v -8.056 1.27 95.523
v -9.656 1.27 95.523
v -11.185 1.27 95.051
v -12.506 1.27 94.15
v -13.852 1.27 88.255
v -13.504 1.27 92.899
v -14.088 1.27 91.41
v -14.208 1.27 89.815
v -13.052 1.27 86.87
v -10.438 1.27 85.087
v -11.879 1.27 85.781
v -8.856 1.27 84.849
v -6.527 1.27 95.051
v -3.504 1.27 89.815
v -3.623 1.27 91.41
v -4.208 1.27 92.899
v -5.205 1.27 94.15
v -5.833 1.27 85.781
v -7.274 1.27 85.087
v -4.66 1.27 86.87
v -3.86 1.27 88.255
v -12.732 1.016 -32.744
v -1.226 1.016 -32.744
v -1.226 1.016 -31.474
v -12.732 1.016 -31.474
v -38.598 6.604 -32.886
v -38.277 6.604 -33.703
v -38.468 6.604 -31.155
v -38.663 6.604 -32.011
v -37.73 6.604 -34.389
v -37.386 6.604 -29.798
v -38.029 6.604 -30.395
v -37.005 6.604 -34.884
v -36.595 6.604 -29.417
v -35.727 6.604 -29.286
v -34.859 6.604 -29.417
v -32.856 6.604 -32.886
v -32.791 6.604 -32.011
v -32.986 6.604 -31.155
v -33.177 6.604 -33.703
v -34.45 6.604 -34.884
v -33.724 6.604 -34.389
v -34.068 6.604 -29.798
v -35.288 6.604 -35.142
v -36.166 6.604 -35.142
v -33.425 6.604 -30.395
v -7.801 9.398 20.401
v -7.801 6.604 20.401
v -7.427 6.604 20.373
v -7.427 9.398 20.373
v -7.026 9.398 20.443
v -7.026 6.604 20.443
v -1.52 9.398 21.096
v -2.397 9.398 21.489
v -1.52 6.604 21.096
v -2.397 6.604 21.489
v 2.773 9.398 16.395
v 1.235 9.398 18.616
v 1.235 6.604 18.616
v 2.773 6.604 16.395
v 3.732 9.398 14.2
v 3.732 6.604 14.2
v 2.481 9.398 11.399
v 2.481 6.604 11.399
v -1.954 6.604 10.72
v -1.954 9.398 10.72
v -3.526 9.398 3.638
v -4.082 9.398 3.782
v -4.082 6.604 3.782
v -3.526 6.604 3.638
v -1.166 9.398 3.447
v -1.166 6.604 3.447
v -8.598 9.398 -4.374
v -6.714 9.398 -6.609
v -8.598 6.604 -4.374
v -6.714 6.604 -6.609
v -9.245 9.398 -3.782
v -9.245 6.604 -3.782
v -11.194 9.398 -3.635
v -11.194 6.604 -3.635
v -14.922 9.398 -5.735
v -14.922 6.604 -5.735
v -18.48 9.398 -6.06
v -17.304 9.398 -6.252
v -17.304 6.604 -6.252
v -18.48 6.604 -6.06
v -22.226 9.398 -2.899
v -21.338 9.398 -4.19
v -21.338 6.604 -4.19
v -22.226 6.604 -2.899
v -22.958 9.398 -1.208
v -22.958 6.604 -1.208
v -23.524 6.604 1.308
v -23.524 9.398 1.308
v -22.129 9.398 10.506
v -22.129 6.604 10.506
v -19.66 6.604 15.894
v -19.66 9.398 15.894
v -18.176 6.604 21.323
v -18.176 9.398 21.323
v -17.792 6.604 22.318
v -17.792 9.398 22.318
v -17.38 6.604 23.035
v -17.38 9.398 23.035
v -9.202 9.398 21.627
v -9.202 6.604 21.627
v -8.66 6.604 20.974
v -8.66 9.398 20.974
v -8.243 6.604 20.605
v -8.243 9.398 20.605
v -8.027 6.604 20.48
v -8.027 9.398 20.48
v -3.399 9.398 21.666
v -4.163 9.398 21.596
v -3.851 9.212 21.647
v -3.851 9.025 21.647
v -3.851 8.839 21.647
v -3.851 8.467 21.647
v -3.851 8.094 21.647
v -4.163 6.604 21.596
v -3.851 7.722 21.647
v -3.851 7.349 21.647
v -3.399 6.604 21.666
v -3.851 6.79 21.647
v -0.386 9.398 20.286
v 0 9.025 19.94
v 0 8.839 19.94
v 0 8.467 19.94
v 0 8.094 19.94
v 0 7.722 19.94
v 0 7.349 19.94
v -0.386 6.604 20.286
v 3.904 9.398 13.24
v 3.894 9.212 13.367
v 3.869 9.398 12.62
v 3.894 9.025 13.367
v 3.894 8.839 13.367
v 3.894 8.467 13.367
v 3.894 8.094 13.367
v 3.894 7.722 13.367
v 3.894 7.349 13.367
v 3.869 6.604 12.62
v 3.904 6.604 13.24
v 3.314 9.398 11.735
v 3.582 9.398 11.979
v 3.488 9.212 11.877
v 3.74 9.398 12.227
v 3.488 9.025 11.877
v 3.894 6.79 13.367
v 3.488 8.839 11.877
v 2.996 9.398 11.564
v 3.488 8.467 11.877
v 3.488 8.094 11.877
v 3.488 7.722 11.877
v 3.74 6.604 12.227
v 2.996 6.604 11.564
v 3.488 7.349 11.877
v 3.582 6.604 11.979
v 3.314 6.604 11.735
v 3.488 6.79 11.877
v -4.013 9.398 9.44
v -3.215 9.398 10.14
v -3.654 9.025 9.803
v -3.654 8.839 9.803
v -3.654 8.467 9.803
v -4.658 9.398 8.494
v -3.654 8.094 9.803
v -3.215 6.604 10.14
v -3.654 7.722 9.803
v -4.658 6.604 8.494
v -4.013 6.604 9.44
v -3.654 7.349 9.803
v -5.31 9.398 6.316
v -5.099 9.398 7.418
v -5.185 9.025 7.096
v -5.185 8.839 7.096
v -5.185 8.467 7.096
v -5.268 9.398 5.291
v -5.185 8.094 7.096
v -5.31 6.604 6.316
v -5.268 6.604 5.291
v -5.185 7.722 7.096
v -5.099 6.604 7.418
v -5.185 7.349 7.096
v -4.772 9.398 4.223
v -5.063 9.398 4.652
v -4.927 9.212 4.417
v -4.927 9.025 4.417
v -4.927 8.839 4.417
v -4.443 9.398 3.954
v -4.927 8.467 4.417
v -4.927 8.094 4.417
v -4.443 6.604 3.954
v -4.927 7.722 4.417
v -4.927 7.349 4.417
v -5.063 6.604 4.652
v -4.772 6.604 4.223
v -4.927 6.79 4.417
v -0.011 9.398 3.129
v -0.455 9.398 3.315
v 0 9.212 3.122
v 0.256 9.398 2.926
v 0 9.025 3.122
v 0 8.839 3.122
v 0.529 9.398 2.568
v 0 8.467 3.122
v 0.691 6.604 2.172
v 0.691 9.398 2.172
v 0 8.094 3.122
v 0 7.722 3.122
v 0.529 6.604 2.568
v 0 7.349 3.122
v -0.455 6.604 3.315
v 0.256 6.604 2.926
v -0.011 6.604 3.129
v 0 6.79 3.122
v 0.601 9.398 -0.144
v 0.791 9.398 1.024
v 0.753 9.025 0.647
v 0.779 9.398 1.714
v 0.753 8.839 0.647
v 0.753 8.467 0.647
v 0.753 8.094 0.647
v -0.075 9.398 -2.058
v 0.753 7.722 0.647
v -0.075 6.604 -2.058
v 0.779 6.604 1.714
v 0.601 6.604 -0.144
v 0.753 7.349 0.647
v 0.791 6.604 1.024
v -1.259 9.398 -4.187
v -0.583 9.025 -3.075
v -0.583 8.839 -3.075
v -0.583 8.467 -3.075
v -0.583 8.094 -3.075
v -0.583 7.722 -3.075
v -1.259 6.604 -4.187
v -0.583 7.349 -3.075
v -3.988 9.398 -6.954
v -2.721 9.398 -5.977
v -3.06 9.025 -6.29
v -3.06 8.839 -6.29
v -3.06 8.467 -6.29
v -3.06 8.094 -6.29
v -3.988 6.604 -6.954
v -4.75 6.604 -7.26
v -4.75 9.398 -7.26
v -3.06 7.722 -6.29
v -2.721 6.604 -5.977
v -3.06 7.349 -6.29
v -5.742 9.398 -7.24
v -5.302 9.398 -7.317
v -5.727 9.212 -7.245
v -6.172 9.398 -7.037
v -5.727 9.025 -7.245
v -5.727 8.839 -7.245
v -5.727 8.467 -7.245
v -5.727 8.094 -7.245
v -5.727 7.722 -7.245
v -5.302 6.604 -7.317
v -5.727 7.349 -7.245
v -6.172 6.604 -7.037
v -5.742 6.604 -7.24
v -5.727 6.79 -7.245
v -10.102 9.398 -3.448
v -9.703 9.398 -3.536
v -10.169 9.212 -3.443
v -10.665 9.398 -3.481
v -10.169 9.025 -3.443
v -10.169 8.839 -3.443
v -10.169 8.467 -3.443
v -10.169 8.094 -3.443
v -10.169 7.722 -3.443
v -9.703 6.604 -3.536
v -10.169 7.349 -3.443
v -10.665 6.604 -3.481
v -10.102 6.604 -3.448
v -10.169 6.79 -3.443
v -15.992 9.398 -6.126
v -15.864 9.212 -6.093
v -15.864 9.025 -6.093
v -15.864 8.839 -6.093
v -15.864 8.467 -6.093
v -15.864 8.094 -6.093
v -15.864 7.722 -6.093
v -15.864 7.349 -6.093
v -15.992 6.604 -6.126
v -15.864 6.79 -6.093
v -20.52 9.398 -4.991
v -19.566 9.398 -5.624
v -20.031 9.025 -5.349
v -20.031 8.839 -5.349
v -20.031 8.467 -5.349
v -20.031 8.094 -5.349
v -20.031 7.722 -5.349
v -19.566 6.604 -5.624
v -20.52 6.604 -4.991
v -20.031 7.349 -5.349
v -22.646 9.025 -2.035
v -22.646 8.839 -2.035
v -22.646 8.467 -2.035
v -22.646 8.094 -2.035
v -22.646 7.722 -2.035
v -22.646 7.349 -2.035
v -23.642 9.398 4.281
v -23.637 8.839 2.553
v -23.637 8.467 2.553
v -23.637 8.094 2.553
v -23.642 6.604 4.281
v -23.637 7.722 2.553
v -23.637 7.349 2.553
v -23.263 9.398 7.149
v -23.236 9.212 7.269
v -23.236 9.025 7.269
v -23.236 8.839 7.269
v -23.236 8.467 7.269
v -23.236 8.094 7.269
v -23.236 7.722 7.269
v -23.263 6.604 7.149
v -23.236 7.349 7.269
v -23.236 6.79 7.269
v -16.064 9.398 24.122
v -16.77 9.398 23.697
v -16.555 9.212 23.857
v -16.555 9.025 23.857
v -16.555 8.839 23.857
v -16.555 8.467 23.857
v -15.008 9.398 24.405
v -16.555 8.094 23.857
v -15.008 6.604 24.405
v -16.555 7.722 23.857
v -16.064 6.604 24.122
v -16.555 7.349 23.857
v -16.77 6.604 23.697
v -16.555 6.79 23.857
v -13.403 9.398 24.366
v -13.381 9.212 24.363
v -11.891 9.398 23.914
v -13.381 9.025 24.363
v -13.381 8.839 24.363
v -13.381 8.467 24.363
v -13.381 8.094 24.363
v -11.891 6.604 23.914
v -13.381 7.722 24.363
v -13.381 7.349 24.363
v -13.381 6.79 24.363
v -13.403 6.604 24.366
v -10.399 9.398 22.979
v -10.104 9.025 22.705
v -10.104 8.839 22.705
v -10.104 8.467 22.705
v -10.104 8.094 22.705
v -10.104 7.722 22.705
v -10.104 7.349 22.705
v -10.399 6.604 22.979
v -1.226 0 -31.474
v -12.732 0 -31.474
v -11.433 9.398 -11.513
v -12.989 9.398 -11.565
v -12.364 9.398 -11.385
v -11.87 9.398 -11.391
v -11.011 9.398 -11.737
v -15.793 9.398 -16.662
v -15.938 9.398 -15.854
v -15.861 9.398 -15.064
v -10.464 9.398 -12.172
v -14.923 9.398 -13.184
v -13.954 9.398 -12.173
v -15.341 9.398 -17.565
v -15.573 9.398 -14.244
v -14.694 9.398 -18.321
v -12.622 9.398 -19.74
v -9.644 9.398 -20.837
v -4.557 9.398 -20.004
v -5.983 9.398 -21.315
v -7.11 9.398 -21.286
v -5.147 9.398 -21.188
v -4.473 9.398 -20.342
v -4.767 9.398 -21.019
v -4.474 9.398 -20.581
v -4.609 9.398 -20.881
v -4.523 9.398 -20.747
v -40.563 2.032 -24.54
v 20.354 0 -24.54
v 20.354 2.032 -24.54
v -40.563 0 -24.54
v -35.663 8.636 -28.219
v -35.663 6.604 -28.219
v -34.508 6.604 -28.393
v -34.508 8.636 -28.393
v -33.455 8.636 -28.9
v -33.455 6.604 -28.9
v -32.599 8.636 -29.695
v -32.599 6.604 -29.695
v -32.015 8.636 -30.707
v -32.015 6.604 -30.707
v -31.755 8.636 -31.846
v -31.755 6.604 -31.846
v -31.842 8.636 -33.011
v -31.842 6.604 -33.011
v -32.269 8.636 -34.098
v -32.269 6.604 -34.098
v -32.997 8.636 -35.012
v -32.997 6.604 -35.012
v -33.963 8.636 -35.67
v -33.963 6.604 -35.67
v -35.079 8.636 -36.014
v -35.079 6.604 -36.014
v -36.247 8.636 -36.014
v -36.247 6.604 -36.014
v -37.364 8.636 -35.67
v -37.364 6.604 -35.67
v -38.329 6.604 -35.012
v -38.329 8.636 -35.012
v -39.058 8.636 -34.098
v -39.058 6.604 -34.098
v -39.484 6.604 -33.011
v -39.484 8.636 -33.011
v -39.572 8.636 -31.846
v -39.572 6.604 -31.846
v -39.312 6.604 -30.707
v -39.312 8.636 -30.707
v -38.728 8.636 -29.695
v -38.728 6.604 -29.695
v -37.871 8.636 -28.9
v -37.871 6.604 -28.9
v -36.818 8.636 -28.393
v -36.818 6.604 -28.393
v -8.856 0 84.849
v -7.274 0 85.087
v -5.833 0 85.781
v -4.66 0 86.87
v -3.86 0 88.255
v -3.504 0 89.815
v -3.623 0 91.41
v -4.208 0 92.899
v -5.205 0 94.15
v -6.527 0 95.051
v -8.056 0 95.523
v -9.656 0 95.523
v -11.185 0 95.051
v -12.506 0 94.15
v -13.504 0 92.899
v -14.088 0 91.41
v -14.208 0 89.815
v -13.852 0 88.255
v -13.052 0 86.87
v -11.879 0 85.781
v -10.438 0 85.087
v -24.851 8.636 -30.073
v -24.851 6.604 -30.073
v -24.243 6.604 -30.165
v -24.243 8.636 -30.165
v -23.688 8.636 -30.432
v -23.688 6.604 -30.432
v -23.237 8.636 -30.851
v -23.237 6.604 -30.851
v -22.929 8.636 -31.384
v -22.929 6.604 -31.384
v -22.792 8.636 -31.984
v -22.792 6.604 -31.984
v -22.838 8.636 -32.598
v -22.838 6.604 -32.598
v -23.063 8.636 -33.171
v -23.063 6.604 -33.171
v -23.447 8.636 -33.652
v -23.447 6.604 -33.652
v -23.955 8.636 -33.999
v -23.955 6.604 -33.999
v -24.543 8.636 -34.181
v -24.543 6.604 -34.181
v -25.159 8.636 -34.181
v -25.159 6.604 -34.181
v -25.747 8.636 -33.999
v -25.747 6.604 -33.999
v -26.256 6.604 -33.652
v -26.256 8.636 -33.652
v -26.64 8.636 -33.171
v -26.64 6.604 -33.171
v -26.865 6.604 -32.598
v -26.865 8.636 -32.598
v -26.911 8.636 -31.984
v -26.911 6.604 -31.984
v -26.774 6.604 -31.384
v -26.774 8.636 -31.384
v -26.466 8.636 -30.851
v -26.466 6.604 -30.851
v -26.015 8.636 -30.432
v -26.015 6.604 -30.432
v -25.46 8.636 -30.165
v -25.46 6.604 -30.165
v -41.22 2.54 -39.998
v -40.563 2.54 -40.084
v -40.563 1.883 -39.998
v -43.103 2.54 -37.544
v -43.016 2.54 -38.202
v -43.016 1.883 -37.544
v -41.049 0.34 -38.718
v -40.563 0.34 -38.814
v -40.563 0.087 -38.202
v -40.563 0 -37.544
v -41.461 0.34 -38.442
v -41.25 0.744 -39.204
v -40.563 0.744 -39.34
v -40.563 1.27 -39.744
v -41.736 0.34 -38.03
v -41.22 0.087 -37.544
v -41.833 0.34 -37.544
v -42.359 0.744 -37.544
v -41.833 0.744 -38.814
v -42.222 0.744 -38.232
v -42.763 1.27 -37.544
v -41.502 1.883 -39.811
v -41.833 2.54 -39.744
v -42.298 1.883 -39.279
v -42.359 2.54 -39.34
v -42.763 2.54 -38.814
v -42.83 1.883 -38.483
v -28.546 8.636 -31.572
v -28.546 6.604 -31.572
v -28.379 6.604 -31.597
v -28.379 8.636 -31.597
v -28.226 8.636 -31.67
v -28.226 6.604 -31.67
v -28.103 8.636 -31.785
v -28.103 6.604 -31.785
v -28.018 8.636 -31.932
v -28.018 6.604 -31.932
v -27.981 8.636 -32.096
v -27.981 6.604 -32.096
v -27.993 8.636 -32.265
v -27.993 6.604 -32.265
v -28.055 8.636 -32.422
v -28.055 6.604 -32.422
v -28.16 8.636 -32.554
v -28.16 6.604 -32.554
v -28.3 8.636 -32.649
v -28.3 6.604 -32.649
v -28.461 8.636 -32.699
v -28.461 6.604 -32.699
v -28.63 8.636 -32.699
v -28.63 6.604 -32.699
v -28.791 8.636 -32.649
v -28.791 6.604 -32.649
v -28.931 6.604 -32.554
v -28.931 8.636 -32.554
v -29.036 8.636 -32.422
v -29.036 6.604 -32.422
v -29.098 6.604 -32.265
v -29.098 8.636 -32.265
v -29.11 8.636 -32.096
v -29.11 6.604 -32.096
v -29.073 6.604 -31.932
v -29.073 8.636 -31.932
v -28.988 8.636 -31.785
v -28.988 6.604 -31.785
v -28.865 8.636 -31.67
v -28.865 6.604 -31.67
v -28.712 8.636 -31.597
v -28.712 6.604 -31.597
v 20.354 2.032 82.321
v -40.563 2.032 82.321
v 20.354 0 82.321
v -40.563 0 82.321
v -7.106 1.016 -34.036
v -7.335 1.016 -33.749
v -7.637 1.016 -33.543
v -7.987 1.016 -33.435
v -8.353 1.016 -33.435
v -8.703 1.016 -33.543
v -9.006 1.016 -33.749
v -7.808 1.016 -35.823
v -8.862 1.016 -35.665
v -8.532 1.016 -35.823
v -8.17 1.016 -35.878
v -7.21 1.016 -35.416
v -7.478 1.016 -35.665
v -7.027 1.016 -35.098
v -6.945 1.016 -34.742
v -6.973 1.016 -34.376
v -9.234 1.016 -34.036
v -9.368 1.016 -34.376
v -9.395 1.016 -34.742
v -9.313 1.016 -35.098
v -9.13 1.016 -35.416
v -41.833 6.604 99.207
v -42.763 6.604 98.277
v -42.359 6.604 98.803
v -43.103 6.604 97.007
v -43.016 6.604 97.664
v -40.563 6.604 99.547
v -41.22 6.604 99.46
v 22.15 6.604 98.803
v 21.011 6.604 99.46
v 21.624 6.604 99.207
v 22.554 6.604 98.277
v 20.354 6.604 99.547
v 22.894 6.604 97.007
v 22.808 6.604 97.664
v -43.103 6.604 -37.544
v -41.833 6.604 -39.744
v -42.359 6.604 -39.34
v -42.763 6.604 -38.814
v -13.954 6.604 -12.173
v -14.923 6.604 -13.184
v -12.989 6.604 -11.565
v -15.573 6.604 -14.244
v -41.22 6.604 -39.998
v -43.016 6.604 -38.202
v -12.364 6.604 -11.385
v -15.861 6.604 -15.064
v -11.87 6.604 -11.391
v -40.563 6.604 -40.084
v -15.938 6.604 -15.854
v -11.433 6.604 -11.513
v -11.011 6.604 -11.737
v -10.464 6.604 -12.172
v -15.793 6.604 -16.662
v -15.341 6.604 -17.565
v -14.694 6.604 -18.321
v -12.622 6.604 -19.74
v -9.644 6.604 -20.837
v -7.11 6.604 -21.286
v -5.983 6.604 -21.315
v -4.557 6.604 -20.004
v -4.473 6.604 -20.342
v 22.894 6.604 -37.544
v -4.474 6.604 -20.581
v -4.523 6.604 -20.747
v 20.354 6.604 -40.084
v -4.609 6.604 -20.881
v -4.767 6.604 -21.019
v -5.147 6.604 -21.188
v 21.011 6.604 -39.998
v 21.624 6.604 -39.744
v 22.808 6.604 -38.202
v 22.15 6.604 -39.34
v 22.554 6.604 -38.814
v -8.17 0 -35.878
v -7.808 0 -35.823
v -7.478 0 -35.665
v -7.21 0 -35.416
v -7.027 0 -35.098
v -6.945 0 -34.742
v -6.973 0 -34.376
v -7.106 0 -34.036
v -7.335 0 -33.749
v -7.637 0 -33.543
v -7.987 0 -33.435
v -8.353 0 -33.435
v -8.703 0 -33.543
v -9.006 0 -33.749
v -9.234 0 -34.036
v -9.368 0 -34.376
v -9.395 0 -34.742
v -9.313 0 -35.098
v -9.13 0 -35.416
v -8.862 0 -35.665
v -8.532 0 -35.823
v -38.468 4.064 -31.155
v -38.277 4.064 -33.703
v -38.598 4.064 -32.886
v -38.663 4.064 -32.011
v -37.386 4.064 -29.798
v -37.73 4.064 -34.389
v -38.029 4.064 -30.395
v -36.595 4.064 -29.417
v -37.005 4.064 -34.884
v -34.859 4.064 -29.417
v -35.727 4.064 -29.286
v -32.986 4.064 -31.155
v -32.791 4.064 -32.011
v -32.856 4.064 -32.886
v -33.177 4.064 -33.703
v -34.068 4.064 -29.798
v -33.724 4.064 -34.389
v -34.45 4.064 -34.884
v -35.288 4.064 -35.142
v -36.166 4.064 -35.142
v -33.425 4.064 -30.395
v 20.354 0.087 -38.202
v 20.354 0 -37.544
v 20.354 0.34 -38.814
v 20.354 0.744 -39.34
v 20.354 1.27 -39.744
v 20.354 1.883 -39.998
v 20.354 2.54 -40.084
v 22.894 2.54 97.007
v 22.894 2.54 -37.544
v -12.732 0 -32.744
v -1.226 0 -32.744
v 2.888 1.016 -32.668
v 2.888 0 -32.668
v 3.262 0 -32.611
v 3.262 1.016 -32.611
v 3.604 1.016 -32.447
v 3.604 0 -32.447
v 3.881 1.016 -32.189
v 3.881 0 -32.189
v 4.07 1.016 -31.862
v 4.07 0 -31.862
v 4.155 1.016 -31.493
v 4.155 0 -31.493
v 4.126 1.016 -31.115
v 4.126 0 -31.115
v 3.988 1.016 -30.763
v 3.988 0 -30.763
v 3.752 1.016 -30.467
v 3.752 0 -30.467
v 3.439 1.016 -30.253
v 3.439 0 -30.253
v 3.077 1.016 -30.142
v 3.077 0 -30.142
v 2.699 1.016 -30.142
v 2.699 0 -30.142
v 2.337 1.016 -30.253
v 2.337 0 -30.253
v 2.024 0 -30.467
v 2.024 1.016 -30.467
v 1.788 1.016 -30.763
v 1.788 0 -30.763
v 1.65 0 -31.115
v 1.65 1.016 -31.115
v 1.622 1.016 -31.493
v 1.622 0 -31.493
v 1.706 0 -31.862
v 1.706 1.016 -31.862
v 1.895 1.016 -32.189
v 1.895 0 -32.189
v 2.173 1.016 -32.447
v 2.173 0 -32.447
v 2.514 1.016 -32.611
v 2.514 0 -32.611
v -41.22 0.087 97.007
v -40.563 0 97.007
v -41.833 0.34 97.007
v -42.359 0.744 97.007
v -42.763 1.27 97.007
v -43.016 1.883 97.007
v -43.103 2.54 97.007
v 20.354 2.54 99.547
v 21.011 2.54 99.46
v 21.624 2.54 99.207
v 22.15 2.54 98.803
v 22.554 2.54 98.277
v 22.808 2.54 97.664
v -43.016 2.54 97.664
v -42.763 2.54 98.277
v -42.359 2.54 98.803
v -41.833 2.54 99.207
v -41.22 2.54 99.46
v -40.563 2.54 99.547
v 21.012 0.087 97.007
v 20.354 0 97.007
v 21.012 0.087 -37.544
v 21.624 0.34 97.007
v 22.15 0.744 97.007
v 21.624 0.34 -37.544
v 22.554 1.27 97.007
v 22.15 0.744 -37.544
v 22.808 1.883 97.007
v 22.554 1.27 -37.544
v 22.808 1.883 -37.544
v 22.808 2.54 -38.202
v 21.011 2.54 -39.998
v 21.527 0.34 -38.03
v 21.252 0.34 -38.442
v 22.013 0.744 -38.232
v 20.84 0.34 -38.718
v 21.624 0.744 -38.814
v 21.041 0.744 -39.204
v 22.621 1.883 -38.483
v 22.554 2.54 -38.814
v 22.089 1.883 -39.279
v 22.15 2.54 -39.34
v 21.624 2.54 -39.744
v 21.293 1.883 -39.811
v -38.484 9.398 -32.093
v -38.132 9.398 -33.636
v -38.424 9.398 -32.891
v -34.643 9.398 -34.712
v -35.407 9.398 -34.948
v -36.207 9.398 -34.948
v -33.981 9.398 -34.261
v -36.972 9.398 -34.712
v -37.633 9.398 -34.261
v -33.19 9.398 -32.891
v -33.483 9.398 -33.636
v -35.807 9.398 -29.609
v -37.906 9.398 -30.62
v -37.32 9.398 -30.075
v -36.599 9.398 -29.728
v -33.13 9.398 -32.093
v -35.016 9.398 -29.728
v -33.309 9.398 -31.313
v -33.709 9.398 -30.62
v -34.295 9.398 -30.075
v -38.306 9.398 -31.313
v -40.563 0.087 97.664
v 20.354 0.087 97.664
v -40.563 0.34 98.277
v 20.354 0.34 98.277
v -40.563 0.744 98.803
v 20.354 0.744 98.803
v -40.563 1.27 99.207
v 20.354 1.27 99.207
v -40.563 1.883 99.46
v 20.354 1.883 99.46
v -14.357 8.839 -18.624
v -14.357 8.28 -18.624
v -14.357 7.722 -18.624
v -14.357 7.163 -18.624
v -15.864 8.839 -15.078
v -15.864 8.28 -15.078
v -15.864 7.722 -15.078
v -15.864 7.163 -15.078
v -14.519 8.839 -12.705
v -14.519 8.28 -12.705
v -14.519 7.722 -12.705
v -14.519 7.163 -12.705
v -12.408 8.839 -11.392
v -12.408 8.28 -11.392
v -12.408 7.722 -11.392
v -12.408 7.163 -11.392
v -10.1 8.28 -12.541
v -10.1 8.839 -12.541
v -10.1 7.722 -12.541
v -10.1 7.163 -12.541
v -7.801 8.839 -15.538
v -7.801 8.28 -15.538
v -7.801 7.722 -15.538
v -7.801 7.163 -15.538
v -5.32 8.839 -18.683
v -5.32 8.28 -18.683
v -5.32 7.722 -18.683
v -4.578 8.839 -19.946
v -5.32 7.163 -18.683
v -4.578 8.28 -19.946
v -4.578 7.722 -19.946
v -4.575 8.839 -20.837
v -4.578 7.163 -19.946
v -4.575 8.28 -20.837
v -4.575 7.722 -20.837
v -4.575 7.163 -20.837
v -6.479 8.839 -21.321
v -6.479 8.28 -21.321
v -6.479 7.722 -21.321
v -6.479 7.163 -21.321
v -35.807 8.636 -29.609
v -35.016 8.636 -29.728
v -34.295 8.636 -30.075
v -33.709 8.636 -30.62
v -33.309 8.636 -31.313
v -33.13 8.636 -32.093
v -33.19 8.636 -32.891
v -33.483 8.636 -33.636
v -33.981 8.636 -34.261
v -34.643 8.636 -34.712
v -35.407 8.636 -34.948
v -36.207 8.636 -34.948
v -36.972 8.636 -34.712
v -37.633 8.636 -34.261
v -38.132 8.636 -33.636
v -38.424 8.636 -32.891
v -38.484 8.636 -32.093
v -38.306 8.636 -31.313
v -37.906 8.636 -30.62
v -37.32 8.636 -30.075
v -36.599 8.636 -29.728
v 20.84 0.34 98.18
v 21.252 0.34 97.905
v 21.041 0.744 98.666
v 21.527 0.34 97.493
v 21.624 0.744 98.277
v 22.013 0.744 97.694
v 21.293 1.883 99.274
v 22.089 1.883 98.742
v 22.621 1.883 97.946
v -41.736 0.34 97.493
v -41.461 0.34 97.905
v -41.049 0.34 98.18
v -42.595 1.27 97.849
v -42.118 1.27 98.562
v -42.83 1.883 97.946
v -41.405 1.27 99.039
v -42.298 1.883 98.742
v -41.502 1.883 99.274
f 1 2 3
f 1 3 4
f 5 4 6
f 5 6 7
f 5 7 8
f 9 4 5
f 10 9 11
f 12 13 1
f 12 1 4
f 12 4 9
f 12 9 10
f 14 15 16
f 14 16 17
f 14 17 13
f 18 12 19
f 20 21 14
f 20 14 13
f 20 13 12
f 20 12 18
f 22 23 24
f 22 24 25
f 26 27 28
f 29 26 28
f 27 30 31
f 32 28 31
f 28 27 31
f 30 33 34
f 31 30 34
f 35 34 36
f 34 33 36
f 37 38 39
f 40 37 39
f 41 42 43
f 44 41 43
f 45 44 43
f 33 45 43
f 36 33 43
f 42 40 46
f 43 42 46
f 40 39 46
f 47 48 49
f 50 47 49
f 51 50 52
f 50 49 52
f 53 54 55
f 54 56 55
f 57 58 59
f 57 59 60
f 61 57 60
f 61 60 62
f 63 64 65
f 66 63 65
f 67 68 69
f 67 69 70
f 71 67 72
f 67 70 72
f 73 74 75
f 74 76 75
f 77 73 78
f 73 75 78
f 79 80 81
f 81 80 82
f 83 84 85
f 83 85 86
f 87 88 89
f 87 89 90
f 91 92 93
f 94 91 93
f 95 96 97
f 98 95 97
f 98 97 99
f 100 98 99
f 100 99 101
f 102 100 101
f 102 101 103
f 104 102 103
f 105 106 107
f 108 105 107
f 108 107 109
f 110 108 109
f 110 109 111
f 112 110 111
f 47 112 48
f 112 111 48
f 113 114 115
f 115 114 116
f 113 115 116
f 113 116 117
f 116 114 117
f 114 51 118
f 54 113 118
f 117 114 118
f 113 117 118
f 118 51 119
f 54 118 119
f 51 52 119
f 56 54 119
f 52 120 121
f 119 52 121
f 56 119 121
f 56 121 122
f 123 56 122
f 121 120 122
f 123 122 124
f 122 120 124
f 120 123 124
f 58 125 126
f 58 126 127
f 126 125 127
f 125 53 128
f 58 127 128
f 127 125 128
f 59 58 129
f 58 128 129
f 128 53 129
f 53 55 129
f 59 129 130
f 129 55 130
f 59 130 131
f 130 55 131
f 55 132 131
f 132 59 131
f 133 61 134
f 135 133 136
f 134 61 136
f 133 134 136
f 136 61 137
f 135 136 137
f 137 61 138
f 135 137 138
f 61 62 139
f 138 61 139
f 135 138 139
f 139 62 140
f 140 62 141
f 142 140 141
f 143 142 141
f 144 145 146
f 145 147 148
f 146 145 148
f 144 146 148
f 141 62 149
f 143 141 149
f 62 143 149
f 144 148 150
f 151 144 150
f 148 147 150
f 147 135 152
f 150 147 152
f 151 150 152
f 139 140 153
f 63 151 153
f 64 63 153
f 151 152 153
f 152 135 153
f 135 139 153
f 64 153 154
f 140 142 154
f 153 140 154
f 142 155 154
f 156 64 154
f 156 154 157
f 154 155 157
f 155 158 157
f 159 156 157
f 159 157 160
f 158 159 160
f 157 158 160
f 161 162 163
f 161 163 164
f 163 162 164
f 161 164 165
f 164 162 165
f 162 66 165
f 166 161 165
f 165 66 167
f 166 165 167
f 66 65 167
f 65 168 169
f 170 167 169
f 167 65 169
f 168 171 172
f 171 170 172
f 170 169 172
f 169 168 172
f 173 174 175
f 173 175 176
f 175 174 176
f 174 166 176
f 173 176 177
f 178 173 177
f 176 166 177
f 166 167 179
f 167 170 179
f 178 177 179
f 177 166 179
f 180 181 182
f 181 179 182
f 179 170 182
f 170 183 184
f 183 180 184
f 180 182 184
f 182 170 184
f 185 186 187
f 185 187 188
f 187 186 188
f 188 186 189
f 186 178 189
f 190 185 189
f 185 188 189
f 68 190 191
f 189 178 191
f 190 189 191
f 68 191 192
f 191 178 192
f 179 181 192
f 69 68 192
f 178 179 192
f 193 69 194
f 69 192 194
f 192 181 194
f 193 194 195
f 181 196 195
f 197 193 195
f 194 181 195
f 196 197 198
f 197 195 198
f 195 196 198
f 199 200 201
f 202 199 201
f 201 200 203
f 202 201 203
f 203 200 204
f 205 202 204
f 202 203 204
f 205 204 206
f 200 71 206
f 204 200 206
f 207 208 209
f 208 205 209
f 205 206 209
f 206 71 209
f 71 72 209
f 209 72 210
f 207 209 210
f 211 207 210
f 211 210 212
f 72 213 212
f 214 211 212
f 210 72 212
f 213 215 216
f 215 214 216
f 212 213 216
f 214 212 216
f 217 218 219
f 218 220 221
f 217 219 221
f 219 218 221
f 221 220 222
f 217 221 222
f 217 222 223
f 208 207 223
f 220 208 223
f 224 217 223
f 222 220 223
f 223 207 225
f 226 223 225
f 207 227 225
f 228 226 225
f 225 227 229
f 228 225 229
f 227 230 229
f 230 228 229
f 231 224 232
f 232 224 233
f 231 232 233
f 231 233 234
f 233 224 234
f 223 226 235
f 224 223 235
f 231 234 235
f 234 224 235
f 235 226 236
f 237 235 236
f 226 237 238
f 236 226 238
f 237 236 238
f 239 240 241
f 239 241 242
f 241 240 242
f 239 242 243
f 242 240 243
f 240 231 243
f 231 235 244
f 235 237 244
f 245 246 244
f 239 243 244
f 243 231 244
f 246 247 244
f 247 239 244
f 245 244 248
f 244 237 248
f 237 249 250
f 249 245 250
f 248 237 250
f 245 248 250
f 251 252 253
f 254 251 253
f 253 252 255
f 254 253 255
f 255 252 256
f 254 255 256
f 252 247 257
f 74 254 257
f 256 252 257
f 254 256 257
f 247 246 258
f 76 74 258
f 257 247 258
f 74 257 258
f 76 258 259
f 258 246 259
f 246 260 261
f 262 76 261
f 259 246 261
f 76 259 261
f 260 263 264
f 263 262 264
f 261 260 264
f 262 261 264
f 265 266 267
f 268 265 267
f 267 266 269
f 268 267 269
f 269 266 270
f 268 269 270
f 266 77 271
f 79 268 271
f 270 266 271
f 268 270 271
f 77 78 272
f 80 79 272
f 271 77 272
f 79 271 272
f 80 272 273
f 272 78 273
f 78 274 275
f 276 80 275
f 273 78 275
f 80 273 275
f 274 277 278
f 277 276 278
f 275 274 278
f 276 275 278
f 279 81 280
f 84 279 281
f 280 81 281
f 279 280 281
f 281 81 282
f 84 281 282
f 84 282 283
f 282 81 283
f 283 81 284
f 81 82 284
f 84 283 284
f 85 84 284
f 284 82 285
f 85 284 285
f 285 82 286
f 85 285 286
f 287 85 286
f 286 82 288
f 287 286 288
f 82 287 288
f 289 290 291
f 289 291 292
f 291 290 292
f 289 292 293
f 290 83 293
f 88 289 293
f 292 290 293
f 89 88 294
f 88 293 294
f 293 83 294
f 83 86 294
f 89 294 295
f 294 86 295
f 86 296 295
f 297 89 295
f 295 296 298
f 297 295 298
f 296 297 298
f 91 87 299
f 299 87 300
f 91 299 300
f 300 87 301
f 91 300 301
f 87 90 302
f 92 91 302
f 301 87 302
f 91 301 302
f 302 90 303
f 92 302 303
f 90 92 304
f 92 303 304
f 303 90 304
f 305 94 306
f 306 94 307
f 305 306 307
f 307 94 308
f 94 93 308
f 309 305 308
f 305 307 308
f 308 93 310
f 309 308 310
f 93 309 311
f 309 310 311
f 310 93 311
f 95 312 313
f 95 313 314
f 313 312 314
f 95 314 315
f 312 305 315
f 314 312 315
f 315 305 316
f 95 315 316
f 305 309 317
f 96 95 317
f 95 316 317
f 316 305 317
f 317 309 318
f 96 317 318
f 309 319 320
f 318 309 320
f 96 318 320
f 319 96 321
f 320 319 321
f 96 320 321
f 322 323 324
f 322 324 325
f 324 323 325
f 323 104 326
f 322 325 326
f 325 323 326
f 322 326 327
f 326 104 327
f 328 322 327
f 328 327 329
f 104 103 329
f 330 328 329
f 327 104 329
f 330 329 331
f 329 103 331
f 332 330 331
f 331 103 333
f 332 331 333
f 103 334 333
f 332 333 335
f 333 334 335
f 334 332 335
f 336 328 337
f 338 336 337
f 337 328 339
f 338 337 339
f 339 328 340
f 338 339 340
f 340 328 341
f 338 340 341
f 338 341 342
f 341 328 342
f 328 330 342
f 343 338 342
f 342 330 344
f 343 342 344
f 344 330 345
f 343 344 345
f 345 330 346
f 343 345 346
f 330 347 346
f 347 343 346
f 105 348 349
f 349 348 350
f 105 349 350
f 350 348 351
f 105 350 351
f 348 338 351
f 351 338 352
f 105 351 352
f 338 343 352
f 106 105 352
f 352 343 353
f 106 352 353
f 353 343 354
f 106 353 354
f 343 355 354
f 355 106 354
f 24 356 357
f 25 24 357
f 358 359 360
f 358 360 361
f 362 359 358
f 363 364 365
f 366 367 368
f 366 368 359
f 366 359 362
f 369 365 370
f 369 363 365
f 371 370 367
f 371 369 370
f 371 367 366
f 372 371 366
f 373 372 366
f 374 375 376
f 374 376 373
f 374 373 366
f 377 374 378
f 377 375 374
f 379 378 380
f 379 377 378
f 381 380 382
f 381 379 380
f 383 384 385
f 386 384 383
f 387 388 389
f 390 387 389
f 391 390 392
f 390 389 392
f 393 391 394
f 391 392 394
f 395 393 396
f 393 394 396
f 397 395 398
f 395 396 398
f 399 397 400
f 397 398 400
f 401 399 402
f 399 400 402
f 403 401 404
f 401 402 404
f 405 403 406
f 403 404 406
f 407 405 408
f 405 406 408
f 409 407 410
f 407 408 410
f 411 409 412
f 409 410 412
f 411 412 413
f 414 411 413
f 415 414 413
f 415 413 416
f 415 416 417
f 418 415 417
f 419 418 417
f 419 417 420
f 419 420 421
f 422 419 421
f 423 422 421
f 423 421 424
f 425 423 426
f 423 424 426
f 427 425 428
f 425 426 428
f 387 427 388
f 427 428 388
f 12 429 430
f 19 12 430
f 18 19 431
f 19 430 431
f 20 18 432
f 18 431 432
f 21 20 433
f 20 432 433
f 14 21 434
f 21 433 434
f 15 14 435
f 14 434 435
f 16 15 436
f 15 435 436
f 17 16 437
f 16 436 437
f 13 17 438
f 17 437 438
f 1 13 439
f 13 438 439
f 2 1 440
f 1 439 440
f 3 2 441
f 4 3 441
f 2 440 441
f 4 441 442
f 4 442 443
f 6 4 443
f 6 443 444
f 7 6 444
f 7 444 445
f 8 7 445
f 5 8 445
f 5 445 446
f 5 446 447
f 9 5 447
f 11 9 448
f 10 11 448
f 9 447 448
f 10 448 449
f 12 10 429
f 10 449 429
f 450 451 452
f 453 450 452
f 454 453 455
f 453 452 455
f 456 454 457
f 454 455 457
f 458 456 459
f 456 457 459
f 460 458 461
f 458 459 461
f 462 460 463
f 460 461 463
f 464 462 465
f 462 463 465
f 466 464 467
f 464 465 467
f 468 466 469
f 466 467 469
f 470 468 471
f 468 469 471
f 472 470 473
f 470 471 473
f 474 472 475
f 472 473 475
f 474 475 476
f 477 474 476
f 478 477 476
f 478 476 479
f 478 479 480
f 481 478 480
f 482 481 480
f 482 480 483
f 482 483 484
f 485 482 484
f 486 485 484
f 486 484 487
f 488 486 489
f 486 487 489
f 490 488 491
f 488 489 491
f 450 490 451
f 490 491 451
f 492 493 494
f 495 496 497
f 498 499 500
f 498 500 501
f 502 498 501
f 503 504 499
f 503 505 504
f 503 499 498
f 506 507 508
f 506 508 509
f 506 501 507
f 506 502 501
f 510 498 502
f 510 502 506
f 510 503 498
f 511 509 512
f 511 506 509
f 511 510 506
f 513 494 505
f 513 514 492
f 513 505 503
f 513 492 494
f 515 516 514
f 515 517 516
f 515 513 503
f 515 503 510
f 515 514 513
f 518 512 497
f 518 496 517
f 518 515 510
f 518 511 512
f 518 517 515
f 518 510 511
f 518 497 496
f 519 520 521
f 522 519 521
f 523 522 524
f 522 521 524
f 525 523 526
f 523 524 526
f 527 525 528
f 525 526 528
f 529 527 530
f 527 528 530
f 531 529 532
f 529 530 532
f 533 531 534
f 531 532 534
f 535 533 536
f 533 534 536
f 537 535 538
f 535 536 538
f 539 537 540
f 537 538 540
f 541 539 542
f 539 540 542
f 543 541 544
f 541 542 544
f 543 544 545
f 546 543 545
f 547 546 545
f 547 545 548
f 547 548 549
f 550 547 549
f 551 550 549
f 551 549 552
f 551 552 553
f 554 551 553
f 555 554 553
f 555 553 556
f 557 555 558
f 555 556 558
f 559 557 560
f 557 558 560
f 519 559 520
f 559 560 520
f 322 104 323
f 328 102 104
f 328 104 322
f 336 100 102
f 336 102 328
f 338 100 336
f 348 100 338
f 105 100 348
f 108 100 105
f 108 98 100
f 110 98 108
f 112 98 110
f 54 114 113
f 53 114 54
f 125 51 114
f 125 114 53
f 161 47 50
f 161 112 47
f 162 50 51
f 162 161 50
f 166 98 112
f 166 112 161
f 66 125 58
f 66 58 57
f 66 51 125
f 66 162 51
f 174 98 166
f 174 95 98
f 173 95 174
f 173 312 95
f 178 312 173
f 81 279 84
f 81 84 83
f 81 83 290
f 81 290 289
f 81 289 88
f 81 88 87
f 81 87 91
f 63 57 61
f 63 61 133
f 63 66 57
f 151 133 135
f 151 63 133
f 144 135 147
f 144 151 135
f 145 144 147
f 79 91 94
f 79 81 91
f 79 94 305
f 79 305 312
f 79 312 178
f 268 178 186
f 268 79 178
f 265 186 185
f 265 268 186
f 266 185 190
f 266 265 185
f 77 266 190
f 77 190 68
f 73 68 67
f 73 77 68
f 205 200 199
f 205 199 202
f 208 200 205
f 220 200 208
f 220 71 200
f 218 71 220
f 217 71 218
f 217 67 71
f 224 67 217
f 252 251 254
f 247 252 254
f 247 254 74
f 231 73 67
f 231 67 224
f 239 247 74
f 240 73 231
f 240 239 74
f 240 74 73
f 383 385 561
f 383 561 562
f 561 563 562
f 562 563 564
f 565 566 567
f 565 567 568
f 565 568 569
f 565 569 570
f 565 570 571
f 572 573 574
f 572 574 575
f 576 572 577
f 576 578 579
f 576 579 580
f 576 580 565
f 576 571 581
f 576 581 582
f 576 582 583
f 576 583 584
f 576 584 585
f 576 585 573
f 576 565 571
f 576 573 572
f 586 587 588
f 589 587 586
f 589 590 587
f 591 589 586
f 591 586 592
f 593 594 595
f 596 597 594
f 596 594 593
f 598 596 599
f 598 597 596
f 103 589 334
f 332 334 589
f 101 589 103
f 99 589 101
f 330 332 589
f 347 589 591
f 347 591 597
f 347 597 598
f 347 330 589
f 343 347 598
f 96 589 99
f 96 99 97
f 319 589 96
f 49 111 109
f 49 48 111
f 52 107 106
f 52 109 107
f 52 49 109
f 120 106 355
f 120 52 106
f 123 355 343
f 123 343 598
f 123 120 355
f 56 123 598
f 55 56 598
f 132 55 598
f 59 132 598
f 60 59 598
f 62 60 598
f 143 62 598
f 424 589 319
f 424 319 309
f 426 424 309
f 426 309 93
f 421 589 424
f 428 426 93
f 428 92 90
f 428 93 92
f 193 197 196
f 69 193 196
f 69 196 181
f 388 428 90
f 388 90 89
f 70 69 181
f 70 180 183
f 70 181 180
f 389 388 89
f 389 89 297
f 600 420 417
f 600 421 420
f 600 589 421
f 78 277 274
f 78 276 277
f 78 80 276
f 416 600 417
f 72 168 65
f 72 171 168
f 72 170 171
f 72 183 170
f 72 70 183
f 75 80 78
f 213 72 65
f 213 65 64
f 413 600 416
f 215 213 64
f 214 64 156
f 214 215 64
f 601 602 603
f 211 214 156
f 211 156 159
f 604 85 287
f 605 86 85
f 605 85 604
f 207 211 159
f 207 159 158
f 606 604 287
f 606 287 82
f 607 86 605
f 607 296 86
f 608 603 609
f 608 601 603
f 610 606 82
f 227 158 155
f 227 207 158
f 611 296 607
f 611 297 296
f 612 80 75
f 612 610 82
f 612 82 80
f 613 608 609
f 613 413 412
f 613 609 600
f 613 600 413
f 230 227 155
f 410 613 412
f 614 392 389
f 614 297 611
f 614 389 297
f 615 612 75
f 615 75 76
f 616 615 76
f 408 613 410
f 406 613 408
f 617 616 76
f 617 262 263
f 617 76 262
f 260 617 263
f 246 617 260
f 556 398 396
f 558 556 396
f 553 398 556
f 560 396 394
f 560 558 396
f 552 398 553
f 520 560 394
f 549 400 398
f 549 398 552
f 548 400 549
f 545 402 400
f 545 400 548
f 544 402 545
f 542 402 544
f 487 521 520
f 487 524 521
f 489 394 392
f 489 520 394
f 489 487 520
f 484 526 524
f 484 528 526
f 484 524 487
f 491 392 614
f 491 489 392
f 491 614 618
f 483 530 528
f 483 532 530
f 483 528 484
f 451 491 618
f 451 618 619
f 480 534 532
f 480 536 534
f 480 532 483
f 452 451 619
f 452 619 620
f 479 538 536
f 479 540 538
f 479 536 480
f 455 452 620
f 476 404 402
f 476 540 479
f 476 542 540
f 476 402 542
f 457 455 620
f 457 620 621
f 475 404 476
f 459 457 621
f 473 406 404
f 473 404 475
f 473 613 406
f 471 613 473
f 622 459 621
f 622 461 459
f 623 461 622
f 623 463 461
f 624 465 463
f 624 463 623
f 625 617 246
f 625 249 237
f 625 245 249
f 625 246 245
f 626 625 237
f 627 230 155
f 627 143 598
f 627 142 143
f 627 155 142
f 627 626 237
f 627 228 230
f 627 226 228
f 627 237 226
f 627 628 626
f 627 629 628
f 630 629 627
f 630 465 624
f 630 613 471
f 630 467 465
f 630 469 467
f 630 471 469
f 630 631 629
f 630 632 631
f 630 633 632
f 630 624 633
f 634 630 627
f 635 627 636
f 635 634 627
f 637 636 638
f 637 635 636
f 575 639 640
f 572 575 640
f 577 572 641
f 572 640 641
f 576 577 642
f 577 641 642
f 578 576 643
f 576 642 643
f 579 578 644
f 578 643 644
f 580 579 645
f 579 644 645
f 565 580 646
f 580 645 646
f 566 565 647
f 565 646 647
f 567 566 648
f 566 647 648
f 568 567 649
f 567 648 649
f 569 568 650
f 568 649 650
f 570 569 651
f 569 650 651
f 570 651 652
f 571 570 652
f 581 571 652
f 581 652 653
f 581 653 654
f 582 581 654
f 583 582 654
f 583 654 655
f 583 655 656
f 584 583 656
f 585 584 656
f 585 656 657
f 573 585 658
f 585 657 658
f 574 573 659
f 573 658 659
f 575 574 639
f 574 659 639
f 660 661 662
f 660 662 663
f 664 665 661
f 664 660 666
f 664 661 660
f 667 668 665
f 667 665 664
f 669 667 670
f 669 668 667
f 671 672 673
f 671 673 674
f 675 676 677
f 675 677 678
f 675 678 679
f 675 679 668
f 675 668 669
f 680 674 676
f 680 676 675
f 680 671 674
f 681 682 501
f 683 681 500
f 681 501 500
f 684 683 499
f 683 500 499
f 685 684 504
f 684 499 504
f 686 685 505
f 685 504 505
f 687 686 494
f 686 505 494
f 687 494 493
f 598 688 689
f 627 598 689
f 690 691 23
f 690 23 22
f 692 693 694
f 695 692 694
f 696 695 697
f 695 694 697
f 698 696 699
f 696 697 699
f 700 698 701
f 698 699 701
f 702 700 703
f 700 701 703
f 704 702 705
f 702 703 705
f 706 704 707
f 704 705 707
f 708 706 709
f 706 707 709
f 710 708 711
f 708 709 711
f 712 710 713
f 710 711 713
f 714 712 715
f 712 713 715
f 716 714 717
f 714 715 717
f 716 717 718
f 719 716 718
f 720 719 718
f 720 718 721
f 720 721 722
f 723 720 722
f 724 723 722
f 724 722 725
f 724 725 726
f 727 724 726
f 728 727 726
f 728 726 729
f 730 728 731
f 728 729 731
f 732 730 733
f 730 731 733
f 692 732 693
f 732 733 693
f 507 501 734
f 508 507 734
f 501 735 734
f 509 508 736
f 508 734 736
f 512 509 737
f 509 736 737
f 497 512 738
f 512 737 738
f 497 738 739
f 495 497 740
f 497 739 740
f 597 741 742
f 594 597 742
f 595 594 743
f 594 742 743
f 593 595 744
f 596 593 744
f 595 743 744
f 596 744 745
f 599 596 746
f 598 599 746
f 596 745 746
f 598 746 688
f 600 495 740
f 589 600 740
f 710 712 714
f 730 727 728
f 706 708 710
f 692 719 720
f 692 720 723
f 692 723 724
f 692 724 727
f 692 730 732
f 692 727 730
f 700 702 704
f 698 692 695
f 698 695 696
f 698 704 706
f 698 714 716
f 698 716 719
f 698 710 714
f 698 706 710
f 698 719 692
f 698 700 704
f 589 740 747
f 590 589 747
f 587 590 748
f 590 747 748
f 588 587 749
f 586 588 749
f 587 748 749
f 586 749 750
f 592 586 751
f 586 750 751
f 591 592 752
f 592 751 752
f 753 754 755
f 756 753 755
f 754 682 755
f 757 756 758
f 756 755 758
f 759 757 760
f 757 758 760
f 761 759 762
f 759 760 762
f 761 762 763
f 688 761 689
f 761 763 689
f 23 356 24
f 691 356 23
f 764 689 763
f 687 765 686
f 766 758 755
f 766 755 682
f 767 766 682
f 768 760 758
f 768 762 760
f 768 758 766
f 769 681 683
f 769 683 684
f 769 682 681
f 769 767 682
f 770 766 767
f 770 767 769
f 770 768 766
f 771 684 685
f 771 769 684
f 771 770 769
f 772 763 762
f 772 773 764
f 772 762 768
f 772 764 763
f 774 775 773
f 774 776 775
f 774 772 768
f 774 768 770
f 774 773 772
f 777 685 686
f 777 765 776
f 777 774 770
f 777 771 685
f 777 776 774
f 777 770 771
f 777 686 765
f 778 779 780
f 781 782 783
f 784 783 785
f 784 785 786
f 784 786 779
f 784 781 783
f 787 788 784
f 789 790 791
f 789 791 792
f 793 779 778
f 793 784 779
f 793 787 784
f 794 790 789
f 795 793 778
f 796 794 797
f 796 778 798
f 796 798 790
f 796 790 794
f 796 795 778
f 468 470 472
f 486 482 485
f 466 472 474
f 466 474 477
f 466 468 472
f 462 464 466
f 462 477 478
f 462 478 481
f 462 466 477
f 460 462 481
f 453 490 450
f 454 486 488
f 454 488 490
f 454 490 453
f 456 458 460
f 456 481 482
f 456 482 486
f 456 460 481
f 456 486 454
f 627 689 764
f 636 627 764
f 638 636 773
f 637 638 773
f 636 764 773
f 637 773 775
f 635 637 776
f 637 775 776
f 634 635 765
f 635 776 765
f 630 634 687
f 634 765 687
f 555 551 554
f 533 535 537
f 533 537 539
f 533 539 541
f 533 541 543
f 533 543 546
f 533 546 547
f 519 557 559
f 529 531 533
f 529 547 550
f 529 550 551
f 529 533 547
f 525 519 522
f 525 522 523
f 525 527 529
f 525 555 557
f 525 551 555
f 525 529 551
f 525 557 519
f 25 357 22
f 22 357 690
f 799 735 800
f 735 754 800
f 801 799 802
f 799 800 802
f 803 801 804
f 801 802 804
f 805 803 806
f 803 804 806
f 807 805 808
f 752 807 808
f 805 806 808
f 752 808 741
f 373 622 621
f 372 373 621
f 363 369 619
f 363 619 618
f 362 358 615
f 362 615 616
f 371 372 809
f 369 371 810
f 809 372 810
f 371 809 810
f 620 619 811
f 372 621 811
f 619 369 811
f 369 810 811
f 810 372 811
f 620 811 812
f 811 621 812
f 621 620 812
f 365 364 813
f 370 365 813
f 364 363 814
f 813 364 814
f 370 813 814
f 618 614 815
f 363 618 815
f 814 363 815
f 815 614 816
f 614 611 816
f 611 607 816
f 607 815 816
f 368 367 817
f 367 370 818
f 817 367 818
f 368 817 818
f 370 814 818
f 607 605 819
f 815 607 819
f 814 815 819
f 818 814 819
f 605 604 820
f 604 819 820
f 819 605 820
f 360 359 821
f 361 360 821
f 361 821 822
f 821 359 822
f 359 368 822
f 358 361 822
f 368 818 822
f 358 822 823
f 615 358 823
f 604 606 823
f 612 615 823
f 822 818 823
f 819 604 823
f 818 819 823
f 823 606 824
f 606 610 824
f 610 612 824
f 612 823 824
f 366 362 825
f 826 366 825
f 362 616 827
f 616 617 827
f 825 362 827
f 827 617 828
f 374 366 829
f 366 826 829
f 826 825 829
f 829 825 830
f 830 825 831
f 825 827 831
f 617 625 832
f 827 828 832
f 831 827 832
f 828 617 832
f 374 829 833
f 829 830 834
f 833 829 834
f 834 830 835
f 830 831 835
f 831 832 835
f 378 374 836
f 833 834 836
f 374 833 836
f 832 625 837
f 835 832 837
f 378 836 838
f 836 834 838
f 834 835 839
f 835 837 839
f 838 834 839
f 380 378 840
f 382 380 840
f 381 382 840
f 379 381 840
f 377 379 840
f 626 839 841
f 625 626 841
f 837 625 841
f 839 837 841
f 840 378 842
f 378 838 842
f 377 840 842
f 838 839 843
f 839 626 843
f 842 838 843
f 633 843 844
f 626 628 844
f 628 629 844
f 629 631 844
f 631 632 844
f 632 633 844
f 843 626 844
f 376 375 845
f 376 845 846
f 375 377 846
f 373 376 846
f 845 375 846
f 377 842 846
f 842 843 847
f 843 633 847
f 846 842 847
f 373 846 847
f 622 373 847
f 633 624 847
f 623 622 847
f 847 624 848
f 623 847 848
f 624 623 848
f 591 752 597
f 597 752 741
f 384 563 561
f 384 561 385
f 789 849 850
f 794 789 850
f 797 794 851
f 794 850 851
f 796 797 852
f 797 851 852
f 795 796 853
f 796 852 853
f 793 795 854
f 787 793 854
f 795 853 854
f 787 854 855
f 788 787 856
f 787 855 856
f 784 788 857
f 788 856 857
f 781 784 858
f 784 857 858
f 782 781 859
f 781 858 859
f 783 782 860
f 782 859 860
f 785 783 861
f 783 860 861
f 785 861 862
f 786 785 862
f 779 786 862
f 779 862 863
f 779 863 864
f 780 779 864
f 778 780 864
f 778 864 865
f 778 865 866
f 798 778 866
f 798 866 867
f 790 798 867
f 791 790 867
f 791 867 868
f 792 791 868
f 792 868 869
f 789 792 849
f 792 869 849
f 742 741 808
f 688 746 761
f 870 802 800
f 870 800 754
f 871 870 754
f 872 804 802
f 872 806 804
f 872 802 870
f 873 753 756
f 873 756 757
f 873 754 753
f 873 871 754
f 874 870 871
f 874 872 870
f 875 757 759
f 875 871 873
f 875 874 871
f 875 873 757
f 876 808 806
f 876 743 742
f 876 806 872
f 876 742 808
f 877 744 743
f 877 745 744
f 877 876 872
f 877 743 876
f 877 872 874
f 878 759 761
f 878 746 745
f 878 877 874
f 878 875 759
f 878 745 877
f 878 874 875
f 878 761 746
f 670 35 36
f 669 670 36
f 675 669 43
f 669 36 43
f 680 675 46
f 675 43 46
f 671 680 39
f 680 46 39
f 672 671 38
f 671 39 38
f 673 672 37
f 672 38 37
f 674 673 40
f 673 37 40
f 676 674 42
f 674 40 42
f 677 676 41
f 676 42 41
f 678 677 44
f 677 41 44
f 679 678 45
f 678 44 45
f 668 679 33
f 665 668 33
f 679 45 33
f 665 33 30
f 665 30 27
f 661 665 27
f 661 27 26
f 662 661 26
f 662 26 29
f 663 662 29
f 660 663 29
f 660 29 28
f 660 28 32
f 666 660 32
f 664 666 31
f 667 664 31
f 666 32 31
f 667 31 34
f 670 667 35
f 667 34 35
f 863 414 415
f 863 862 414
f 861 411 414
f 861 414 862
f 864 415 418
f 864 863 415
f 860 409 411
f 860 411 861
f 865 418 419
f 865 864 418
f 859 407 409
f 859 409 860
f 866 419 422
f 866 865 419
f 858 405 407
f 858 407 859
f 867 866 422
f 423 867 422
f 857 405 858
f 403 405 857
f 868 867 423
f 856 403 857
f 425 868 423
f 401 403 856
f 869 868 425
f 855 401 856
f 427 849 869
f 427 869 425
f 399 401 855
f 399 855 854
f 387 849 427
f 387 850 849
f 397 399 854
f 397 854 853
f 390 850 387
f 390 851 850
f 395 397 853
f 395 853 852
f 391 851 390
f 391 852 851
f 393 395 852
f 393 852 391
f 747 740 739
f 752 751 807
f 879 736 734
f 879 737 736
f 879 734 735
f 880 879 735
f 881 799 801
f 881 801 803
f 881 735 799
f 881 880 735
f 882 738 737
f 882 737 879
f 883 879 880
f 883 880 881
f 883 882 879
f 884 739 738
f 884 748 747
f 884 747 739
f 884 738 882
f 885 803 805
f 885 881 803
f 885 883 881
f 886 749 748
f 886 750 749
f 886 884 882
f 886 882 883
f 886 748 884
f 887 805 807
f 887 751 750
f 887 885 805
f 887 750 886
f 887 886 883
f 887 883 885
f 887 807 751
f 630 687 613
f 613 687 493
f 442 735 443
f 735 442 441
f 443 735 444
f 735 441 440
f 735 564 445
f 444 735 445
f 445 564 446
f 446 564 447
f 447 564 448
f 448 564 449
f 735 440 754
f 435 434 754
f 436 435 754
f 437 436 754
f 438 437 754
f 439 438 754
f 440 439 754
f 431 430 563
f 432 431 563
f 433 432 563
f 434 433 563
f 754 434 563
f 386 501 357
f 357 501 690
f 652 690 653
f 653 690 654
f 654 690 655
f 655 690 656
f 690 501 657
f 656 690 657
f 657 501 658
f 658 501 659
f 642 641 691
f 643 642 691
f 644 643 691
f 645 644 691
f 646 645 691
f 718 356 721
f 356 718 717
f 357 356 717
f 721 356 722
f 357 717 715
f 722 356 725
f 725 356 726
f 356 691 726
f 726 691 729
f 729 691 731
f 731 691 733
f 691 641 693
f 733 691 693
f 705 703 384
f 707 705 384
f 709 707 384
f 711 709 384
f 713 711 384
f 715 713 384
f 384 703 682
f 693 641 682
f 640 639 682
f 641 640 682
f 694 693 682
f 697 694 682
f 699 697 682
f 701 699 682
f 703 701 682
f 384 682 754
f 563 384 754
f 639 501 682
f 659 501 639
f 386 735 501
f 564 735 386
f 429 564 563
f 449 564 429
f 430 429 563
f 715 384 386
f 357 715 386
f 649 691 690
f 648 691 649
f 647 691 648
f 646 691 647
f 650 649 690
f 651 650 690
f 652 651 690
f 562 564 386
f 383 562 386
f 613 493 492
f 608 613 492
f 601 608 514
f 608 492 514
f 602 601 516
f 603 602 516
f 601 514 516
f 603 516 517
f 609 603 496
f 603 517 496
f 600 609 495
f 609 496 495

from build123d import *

# Parameters (mm, degrees)
BOSS_EXTRUDE1_DEPTH = 6.604
SKETCH2_R           = 3.919504197
SKETCH2_R_2         = 0.566443641
SKETCH2_R_3         = 2.065239225
BOSS_EXTRUDE2_DEPTH = 2.032
SKETCH3_W           = 60.9169051
SKETCH3_H           = 106.860686568
CUT_EXTRUDE1_DEPTH  = 2.032
SKETCH4_R           = 5.367061821
CUT_EXTRUDE2_DEPTH  = 1.27
SKETCH5_R           = 1.27
SKETCH5_R_2         = 1.228205677
SKETCH5_W           = 11.5062
SKETCH5_H           = 1.27
CUT_EXTRUDE3_DEPTH  = 1.016
FILLET1_R           = 2.54
SKETCH7_R           = 2.94444965
CUT_EXTRUDE4_DEPTH  = 2.54
SKETCH8_R           = 2.684422541
BOSS_EXTRUDE3_DEPTH = 0.762
BOSS_EXTRUDE4_DEPTH = 2.794


with BuildPart() as part:
    # Sketch1 → Boss-Extrude1 (new body)
    with BuildSketch(Plane(origin=(0, 0, 0), x_dir=(1, 0, 0), z_dir=(0, 1, 0))):
        with BuildLine():
            Line((-43.10281748, 37.544399845), (-43.10281748, -97.006983228))
            ThreePointArc((-43.10281748, -97.006983228), (-42.358868704, -98.803034452), (-40.56281748, -99.546983228))
            Line((-40.56281748, -99.546983228), (20.35408762, -99.546983228))
            ThreePointArc((20.35408762, -99.546983228), (22.150138844, -98.803034452), (22.89408762, -97.006983228))
            Line((22.89408762, -97.006983228), (22.89408762, 37.544399845))
            ThreePointArc((22.89408762, 37.544399845), (22.150138844, 39.340451069), (20.35408762, 40.084399845))
            Line((20.35408762, 40.084399845), (-40.56281748, 40.084399845))
            ThreePointArc((-40.56281748, 40.084399845), (-42.358868704, 39.340451069), (-43.10281748, 37.544399845))
        make_face()
    extrude(amount=BOSS_EXTRUDE1_DEPTH)

    # Sketch2 → Boss-Extrude2 (add)
    with BuildSketch(Plane(origin=(0, 6.604, 0), x_dir=(1, 0, 0), z_dir=(0, 1, 0))):
        with Locations(Location((-35.663139583, 32.138490209, 0), (0, 0, 270))):
            Circle(SKETCH2_R)
        with Locations(Location((-28.54550888, 32.138490209, 0), (0, 0, 270))):
            Circle(SKETCH2_R_2)
        with Locations(Location((-24.851263483, 32.138490209, 0), (0, 0, 270))):
            Circle(SKETCH2_R_3)
    extrude(amount=BOSS_EXTRUDE2_DEPTH)

    # Sketch3 → Cut-Extrude1 (cut)
    with BuildSketch(Plane(origin=(0, 0, 0), x_dir=(-1, 0, 0), z_dir=(0, -1, 0))):
        with Locations((10.10436493, -28.890743439)):
            Rectangle(SKETCH3_W, SKETCH3_H)
    extrude(amount=-CUT_EXTRUDE1_DEPTH, mode=Mode.SUBTRACT)

    # Sketch4 → Cut-Extrude2 (cut)
    with BuildSketch(Plane(origin=(0, 0, 0), x_dir=(-1, 0, 0), z_dir=(0, -1, 0))):
        with Locations(Location((8.85591238, -90.215843688, 0), (0, 0, 90))):
            Circle(SKETCH4_R)
    extrude(amount=-CUT_EXTRUDE2_DEPTH, mode=Mode.SUBTRACT)

    # Sketch5 → Cut-Extrude3 (cut)
    with BuildSketch(Plane(origin=(0, 0, 0), x_dir=(-1, 0, 0), z_dir=(0, -1, 0))):
        with Locations(Location((-2.888143629, 31.397599845, 0), (0, 0, 90))):
            Circle(SKETCH5_R)
        with Locations(Location((8.17011238, 34.649772777, 0), (0, 0, 90))):
            Circle(SKETCH5_R_2)
        with Locations((6.979145606, 32.108799845)):
            Rectangle(SKETCH5_W, SKETCH5_H)
    extrude(amount=-CUT_EXTRUDE3_DEPTH, mode=Mode.SUBTRACT)

    # Fillet1
    fillet1_edges = [part.edges().sort_by_distance(p)[0] for p in [
        (-10.10436493, 0, 99.546983228),
        (-42.358868704, 0, 98.803034452),
        (-43.10281748, 0, 29.731291691),
        (-42.358868704, 0, -39.340451069),
        (-10.10436493, 0, -40.084399845),
        (22.150138844, 0, -39.340451069),
        (22.89408762, 0, 29.731291691),
        (22.150138844, 0, 98.803034452),
    ]]
    fillet(fillet1_edges, radius=FILLET1_R - 0.0001)  # a hair under: the kernel refuses the full size

    # Sketch7 → Cut-Extrude4 (cut)
    with BuildSketch(Plane(origin=(0, 6.604, 0), x_dir=(1, 0, 0), z_dir=(0, 1, 0))):
        with Locations(Location((-35.727053618, 32.230916755, 0), (0, 0, 270))):
            Circle(SKETCH7_R)
    extrude(amount=-CUT_EXTRUDE4_DEPTH, mode=Mode.SUBTRACT)

    # Sketch8 → Boss-Extrude3 (add)
    with BuildSketch(Plane(origin=(0, 8.636, 0), x_dir=(1, 0, 0), z_dir=(0, 1, 0))):
        with Locations(Location((-35.807369042, 32.29345464, 0), (0, 0, 270))):
            Circle(SKETCH8_R)
    extrude(amount=BOSS_EXTRUDE3_DEPTH)

    # Sketch9 → Boss-Extrude4 (add)
    with BuildSketch(Plane(origin=(0, 6.604, 0), x_dir=(1, 0, 0), z_dir=(0, 1, 0))):
        with BuildLine():
            add(Edge.make_bspline(
                [(-7.80056122, -20.400886664), (-6.853360215, -20.178132505), (-3.922309563, -22.559935581), (1.360717881, -19.787898202), (6.834958004, -9.595166337), (-4.531339922, -12.448510053), (-6.44086429, -2.492436288), (4.901372473, -5.250452874), (-4.864824897, 12.659038777), (-9.601591513, 0.785158014), (-14.758268239, 6.889505713), (-23.234536447, 5.313079767), (-24.998229305, -7.882064839), (-18.817560553, -15.369837595), (-18.02361733, -25.428704355), (-10.373296019, -24.261756275), (-8.647763554, -20.600124041), (-7.80056122, -20.400886664)],
                knots=[0, 0, 0, 0, 0.03510517, 0.079769117, 0.16443694, 0.236106534, 0.292318671, 0.337297107, 0.45144008, 0.503272243, 0.568002979, 0.603803369, 0.733112444, 0.840719956, 0.905450692, 0.968600981, 1, 1, 1, 1], degree=3))
        make_face()
        with BuildLine():
            add(Edge.make_bspline(
                [(-9.643604188, 20.837199752), (-13.307399758, 19.890492956), (-18.362036209, 16.557305032), (-11.701266913, 9.334871489), (-8.26923518, 15.538956926), (-2.186712873, 21.75435962), (-7.453097508, 21.403215929), (-9.643604188, 20.837199752)],
                knots=[0, 0, 0, 0, 0.273456617, 0.436443121, 0.636405543, 0.836506013, 1, 1, 1, 1], degree=3))
        make_face()
    extrude(amount=BOSS_EXTRUDE4_DEPTH)


solid = part.part
